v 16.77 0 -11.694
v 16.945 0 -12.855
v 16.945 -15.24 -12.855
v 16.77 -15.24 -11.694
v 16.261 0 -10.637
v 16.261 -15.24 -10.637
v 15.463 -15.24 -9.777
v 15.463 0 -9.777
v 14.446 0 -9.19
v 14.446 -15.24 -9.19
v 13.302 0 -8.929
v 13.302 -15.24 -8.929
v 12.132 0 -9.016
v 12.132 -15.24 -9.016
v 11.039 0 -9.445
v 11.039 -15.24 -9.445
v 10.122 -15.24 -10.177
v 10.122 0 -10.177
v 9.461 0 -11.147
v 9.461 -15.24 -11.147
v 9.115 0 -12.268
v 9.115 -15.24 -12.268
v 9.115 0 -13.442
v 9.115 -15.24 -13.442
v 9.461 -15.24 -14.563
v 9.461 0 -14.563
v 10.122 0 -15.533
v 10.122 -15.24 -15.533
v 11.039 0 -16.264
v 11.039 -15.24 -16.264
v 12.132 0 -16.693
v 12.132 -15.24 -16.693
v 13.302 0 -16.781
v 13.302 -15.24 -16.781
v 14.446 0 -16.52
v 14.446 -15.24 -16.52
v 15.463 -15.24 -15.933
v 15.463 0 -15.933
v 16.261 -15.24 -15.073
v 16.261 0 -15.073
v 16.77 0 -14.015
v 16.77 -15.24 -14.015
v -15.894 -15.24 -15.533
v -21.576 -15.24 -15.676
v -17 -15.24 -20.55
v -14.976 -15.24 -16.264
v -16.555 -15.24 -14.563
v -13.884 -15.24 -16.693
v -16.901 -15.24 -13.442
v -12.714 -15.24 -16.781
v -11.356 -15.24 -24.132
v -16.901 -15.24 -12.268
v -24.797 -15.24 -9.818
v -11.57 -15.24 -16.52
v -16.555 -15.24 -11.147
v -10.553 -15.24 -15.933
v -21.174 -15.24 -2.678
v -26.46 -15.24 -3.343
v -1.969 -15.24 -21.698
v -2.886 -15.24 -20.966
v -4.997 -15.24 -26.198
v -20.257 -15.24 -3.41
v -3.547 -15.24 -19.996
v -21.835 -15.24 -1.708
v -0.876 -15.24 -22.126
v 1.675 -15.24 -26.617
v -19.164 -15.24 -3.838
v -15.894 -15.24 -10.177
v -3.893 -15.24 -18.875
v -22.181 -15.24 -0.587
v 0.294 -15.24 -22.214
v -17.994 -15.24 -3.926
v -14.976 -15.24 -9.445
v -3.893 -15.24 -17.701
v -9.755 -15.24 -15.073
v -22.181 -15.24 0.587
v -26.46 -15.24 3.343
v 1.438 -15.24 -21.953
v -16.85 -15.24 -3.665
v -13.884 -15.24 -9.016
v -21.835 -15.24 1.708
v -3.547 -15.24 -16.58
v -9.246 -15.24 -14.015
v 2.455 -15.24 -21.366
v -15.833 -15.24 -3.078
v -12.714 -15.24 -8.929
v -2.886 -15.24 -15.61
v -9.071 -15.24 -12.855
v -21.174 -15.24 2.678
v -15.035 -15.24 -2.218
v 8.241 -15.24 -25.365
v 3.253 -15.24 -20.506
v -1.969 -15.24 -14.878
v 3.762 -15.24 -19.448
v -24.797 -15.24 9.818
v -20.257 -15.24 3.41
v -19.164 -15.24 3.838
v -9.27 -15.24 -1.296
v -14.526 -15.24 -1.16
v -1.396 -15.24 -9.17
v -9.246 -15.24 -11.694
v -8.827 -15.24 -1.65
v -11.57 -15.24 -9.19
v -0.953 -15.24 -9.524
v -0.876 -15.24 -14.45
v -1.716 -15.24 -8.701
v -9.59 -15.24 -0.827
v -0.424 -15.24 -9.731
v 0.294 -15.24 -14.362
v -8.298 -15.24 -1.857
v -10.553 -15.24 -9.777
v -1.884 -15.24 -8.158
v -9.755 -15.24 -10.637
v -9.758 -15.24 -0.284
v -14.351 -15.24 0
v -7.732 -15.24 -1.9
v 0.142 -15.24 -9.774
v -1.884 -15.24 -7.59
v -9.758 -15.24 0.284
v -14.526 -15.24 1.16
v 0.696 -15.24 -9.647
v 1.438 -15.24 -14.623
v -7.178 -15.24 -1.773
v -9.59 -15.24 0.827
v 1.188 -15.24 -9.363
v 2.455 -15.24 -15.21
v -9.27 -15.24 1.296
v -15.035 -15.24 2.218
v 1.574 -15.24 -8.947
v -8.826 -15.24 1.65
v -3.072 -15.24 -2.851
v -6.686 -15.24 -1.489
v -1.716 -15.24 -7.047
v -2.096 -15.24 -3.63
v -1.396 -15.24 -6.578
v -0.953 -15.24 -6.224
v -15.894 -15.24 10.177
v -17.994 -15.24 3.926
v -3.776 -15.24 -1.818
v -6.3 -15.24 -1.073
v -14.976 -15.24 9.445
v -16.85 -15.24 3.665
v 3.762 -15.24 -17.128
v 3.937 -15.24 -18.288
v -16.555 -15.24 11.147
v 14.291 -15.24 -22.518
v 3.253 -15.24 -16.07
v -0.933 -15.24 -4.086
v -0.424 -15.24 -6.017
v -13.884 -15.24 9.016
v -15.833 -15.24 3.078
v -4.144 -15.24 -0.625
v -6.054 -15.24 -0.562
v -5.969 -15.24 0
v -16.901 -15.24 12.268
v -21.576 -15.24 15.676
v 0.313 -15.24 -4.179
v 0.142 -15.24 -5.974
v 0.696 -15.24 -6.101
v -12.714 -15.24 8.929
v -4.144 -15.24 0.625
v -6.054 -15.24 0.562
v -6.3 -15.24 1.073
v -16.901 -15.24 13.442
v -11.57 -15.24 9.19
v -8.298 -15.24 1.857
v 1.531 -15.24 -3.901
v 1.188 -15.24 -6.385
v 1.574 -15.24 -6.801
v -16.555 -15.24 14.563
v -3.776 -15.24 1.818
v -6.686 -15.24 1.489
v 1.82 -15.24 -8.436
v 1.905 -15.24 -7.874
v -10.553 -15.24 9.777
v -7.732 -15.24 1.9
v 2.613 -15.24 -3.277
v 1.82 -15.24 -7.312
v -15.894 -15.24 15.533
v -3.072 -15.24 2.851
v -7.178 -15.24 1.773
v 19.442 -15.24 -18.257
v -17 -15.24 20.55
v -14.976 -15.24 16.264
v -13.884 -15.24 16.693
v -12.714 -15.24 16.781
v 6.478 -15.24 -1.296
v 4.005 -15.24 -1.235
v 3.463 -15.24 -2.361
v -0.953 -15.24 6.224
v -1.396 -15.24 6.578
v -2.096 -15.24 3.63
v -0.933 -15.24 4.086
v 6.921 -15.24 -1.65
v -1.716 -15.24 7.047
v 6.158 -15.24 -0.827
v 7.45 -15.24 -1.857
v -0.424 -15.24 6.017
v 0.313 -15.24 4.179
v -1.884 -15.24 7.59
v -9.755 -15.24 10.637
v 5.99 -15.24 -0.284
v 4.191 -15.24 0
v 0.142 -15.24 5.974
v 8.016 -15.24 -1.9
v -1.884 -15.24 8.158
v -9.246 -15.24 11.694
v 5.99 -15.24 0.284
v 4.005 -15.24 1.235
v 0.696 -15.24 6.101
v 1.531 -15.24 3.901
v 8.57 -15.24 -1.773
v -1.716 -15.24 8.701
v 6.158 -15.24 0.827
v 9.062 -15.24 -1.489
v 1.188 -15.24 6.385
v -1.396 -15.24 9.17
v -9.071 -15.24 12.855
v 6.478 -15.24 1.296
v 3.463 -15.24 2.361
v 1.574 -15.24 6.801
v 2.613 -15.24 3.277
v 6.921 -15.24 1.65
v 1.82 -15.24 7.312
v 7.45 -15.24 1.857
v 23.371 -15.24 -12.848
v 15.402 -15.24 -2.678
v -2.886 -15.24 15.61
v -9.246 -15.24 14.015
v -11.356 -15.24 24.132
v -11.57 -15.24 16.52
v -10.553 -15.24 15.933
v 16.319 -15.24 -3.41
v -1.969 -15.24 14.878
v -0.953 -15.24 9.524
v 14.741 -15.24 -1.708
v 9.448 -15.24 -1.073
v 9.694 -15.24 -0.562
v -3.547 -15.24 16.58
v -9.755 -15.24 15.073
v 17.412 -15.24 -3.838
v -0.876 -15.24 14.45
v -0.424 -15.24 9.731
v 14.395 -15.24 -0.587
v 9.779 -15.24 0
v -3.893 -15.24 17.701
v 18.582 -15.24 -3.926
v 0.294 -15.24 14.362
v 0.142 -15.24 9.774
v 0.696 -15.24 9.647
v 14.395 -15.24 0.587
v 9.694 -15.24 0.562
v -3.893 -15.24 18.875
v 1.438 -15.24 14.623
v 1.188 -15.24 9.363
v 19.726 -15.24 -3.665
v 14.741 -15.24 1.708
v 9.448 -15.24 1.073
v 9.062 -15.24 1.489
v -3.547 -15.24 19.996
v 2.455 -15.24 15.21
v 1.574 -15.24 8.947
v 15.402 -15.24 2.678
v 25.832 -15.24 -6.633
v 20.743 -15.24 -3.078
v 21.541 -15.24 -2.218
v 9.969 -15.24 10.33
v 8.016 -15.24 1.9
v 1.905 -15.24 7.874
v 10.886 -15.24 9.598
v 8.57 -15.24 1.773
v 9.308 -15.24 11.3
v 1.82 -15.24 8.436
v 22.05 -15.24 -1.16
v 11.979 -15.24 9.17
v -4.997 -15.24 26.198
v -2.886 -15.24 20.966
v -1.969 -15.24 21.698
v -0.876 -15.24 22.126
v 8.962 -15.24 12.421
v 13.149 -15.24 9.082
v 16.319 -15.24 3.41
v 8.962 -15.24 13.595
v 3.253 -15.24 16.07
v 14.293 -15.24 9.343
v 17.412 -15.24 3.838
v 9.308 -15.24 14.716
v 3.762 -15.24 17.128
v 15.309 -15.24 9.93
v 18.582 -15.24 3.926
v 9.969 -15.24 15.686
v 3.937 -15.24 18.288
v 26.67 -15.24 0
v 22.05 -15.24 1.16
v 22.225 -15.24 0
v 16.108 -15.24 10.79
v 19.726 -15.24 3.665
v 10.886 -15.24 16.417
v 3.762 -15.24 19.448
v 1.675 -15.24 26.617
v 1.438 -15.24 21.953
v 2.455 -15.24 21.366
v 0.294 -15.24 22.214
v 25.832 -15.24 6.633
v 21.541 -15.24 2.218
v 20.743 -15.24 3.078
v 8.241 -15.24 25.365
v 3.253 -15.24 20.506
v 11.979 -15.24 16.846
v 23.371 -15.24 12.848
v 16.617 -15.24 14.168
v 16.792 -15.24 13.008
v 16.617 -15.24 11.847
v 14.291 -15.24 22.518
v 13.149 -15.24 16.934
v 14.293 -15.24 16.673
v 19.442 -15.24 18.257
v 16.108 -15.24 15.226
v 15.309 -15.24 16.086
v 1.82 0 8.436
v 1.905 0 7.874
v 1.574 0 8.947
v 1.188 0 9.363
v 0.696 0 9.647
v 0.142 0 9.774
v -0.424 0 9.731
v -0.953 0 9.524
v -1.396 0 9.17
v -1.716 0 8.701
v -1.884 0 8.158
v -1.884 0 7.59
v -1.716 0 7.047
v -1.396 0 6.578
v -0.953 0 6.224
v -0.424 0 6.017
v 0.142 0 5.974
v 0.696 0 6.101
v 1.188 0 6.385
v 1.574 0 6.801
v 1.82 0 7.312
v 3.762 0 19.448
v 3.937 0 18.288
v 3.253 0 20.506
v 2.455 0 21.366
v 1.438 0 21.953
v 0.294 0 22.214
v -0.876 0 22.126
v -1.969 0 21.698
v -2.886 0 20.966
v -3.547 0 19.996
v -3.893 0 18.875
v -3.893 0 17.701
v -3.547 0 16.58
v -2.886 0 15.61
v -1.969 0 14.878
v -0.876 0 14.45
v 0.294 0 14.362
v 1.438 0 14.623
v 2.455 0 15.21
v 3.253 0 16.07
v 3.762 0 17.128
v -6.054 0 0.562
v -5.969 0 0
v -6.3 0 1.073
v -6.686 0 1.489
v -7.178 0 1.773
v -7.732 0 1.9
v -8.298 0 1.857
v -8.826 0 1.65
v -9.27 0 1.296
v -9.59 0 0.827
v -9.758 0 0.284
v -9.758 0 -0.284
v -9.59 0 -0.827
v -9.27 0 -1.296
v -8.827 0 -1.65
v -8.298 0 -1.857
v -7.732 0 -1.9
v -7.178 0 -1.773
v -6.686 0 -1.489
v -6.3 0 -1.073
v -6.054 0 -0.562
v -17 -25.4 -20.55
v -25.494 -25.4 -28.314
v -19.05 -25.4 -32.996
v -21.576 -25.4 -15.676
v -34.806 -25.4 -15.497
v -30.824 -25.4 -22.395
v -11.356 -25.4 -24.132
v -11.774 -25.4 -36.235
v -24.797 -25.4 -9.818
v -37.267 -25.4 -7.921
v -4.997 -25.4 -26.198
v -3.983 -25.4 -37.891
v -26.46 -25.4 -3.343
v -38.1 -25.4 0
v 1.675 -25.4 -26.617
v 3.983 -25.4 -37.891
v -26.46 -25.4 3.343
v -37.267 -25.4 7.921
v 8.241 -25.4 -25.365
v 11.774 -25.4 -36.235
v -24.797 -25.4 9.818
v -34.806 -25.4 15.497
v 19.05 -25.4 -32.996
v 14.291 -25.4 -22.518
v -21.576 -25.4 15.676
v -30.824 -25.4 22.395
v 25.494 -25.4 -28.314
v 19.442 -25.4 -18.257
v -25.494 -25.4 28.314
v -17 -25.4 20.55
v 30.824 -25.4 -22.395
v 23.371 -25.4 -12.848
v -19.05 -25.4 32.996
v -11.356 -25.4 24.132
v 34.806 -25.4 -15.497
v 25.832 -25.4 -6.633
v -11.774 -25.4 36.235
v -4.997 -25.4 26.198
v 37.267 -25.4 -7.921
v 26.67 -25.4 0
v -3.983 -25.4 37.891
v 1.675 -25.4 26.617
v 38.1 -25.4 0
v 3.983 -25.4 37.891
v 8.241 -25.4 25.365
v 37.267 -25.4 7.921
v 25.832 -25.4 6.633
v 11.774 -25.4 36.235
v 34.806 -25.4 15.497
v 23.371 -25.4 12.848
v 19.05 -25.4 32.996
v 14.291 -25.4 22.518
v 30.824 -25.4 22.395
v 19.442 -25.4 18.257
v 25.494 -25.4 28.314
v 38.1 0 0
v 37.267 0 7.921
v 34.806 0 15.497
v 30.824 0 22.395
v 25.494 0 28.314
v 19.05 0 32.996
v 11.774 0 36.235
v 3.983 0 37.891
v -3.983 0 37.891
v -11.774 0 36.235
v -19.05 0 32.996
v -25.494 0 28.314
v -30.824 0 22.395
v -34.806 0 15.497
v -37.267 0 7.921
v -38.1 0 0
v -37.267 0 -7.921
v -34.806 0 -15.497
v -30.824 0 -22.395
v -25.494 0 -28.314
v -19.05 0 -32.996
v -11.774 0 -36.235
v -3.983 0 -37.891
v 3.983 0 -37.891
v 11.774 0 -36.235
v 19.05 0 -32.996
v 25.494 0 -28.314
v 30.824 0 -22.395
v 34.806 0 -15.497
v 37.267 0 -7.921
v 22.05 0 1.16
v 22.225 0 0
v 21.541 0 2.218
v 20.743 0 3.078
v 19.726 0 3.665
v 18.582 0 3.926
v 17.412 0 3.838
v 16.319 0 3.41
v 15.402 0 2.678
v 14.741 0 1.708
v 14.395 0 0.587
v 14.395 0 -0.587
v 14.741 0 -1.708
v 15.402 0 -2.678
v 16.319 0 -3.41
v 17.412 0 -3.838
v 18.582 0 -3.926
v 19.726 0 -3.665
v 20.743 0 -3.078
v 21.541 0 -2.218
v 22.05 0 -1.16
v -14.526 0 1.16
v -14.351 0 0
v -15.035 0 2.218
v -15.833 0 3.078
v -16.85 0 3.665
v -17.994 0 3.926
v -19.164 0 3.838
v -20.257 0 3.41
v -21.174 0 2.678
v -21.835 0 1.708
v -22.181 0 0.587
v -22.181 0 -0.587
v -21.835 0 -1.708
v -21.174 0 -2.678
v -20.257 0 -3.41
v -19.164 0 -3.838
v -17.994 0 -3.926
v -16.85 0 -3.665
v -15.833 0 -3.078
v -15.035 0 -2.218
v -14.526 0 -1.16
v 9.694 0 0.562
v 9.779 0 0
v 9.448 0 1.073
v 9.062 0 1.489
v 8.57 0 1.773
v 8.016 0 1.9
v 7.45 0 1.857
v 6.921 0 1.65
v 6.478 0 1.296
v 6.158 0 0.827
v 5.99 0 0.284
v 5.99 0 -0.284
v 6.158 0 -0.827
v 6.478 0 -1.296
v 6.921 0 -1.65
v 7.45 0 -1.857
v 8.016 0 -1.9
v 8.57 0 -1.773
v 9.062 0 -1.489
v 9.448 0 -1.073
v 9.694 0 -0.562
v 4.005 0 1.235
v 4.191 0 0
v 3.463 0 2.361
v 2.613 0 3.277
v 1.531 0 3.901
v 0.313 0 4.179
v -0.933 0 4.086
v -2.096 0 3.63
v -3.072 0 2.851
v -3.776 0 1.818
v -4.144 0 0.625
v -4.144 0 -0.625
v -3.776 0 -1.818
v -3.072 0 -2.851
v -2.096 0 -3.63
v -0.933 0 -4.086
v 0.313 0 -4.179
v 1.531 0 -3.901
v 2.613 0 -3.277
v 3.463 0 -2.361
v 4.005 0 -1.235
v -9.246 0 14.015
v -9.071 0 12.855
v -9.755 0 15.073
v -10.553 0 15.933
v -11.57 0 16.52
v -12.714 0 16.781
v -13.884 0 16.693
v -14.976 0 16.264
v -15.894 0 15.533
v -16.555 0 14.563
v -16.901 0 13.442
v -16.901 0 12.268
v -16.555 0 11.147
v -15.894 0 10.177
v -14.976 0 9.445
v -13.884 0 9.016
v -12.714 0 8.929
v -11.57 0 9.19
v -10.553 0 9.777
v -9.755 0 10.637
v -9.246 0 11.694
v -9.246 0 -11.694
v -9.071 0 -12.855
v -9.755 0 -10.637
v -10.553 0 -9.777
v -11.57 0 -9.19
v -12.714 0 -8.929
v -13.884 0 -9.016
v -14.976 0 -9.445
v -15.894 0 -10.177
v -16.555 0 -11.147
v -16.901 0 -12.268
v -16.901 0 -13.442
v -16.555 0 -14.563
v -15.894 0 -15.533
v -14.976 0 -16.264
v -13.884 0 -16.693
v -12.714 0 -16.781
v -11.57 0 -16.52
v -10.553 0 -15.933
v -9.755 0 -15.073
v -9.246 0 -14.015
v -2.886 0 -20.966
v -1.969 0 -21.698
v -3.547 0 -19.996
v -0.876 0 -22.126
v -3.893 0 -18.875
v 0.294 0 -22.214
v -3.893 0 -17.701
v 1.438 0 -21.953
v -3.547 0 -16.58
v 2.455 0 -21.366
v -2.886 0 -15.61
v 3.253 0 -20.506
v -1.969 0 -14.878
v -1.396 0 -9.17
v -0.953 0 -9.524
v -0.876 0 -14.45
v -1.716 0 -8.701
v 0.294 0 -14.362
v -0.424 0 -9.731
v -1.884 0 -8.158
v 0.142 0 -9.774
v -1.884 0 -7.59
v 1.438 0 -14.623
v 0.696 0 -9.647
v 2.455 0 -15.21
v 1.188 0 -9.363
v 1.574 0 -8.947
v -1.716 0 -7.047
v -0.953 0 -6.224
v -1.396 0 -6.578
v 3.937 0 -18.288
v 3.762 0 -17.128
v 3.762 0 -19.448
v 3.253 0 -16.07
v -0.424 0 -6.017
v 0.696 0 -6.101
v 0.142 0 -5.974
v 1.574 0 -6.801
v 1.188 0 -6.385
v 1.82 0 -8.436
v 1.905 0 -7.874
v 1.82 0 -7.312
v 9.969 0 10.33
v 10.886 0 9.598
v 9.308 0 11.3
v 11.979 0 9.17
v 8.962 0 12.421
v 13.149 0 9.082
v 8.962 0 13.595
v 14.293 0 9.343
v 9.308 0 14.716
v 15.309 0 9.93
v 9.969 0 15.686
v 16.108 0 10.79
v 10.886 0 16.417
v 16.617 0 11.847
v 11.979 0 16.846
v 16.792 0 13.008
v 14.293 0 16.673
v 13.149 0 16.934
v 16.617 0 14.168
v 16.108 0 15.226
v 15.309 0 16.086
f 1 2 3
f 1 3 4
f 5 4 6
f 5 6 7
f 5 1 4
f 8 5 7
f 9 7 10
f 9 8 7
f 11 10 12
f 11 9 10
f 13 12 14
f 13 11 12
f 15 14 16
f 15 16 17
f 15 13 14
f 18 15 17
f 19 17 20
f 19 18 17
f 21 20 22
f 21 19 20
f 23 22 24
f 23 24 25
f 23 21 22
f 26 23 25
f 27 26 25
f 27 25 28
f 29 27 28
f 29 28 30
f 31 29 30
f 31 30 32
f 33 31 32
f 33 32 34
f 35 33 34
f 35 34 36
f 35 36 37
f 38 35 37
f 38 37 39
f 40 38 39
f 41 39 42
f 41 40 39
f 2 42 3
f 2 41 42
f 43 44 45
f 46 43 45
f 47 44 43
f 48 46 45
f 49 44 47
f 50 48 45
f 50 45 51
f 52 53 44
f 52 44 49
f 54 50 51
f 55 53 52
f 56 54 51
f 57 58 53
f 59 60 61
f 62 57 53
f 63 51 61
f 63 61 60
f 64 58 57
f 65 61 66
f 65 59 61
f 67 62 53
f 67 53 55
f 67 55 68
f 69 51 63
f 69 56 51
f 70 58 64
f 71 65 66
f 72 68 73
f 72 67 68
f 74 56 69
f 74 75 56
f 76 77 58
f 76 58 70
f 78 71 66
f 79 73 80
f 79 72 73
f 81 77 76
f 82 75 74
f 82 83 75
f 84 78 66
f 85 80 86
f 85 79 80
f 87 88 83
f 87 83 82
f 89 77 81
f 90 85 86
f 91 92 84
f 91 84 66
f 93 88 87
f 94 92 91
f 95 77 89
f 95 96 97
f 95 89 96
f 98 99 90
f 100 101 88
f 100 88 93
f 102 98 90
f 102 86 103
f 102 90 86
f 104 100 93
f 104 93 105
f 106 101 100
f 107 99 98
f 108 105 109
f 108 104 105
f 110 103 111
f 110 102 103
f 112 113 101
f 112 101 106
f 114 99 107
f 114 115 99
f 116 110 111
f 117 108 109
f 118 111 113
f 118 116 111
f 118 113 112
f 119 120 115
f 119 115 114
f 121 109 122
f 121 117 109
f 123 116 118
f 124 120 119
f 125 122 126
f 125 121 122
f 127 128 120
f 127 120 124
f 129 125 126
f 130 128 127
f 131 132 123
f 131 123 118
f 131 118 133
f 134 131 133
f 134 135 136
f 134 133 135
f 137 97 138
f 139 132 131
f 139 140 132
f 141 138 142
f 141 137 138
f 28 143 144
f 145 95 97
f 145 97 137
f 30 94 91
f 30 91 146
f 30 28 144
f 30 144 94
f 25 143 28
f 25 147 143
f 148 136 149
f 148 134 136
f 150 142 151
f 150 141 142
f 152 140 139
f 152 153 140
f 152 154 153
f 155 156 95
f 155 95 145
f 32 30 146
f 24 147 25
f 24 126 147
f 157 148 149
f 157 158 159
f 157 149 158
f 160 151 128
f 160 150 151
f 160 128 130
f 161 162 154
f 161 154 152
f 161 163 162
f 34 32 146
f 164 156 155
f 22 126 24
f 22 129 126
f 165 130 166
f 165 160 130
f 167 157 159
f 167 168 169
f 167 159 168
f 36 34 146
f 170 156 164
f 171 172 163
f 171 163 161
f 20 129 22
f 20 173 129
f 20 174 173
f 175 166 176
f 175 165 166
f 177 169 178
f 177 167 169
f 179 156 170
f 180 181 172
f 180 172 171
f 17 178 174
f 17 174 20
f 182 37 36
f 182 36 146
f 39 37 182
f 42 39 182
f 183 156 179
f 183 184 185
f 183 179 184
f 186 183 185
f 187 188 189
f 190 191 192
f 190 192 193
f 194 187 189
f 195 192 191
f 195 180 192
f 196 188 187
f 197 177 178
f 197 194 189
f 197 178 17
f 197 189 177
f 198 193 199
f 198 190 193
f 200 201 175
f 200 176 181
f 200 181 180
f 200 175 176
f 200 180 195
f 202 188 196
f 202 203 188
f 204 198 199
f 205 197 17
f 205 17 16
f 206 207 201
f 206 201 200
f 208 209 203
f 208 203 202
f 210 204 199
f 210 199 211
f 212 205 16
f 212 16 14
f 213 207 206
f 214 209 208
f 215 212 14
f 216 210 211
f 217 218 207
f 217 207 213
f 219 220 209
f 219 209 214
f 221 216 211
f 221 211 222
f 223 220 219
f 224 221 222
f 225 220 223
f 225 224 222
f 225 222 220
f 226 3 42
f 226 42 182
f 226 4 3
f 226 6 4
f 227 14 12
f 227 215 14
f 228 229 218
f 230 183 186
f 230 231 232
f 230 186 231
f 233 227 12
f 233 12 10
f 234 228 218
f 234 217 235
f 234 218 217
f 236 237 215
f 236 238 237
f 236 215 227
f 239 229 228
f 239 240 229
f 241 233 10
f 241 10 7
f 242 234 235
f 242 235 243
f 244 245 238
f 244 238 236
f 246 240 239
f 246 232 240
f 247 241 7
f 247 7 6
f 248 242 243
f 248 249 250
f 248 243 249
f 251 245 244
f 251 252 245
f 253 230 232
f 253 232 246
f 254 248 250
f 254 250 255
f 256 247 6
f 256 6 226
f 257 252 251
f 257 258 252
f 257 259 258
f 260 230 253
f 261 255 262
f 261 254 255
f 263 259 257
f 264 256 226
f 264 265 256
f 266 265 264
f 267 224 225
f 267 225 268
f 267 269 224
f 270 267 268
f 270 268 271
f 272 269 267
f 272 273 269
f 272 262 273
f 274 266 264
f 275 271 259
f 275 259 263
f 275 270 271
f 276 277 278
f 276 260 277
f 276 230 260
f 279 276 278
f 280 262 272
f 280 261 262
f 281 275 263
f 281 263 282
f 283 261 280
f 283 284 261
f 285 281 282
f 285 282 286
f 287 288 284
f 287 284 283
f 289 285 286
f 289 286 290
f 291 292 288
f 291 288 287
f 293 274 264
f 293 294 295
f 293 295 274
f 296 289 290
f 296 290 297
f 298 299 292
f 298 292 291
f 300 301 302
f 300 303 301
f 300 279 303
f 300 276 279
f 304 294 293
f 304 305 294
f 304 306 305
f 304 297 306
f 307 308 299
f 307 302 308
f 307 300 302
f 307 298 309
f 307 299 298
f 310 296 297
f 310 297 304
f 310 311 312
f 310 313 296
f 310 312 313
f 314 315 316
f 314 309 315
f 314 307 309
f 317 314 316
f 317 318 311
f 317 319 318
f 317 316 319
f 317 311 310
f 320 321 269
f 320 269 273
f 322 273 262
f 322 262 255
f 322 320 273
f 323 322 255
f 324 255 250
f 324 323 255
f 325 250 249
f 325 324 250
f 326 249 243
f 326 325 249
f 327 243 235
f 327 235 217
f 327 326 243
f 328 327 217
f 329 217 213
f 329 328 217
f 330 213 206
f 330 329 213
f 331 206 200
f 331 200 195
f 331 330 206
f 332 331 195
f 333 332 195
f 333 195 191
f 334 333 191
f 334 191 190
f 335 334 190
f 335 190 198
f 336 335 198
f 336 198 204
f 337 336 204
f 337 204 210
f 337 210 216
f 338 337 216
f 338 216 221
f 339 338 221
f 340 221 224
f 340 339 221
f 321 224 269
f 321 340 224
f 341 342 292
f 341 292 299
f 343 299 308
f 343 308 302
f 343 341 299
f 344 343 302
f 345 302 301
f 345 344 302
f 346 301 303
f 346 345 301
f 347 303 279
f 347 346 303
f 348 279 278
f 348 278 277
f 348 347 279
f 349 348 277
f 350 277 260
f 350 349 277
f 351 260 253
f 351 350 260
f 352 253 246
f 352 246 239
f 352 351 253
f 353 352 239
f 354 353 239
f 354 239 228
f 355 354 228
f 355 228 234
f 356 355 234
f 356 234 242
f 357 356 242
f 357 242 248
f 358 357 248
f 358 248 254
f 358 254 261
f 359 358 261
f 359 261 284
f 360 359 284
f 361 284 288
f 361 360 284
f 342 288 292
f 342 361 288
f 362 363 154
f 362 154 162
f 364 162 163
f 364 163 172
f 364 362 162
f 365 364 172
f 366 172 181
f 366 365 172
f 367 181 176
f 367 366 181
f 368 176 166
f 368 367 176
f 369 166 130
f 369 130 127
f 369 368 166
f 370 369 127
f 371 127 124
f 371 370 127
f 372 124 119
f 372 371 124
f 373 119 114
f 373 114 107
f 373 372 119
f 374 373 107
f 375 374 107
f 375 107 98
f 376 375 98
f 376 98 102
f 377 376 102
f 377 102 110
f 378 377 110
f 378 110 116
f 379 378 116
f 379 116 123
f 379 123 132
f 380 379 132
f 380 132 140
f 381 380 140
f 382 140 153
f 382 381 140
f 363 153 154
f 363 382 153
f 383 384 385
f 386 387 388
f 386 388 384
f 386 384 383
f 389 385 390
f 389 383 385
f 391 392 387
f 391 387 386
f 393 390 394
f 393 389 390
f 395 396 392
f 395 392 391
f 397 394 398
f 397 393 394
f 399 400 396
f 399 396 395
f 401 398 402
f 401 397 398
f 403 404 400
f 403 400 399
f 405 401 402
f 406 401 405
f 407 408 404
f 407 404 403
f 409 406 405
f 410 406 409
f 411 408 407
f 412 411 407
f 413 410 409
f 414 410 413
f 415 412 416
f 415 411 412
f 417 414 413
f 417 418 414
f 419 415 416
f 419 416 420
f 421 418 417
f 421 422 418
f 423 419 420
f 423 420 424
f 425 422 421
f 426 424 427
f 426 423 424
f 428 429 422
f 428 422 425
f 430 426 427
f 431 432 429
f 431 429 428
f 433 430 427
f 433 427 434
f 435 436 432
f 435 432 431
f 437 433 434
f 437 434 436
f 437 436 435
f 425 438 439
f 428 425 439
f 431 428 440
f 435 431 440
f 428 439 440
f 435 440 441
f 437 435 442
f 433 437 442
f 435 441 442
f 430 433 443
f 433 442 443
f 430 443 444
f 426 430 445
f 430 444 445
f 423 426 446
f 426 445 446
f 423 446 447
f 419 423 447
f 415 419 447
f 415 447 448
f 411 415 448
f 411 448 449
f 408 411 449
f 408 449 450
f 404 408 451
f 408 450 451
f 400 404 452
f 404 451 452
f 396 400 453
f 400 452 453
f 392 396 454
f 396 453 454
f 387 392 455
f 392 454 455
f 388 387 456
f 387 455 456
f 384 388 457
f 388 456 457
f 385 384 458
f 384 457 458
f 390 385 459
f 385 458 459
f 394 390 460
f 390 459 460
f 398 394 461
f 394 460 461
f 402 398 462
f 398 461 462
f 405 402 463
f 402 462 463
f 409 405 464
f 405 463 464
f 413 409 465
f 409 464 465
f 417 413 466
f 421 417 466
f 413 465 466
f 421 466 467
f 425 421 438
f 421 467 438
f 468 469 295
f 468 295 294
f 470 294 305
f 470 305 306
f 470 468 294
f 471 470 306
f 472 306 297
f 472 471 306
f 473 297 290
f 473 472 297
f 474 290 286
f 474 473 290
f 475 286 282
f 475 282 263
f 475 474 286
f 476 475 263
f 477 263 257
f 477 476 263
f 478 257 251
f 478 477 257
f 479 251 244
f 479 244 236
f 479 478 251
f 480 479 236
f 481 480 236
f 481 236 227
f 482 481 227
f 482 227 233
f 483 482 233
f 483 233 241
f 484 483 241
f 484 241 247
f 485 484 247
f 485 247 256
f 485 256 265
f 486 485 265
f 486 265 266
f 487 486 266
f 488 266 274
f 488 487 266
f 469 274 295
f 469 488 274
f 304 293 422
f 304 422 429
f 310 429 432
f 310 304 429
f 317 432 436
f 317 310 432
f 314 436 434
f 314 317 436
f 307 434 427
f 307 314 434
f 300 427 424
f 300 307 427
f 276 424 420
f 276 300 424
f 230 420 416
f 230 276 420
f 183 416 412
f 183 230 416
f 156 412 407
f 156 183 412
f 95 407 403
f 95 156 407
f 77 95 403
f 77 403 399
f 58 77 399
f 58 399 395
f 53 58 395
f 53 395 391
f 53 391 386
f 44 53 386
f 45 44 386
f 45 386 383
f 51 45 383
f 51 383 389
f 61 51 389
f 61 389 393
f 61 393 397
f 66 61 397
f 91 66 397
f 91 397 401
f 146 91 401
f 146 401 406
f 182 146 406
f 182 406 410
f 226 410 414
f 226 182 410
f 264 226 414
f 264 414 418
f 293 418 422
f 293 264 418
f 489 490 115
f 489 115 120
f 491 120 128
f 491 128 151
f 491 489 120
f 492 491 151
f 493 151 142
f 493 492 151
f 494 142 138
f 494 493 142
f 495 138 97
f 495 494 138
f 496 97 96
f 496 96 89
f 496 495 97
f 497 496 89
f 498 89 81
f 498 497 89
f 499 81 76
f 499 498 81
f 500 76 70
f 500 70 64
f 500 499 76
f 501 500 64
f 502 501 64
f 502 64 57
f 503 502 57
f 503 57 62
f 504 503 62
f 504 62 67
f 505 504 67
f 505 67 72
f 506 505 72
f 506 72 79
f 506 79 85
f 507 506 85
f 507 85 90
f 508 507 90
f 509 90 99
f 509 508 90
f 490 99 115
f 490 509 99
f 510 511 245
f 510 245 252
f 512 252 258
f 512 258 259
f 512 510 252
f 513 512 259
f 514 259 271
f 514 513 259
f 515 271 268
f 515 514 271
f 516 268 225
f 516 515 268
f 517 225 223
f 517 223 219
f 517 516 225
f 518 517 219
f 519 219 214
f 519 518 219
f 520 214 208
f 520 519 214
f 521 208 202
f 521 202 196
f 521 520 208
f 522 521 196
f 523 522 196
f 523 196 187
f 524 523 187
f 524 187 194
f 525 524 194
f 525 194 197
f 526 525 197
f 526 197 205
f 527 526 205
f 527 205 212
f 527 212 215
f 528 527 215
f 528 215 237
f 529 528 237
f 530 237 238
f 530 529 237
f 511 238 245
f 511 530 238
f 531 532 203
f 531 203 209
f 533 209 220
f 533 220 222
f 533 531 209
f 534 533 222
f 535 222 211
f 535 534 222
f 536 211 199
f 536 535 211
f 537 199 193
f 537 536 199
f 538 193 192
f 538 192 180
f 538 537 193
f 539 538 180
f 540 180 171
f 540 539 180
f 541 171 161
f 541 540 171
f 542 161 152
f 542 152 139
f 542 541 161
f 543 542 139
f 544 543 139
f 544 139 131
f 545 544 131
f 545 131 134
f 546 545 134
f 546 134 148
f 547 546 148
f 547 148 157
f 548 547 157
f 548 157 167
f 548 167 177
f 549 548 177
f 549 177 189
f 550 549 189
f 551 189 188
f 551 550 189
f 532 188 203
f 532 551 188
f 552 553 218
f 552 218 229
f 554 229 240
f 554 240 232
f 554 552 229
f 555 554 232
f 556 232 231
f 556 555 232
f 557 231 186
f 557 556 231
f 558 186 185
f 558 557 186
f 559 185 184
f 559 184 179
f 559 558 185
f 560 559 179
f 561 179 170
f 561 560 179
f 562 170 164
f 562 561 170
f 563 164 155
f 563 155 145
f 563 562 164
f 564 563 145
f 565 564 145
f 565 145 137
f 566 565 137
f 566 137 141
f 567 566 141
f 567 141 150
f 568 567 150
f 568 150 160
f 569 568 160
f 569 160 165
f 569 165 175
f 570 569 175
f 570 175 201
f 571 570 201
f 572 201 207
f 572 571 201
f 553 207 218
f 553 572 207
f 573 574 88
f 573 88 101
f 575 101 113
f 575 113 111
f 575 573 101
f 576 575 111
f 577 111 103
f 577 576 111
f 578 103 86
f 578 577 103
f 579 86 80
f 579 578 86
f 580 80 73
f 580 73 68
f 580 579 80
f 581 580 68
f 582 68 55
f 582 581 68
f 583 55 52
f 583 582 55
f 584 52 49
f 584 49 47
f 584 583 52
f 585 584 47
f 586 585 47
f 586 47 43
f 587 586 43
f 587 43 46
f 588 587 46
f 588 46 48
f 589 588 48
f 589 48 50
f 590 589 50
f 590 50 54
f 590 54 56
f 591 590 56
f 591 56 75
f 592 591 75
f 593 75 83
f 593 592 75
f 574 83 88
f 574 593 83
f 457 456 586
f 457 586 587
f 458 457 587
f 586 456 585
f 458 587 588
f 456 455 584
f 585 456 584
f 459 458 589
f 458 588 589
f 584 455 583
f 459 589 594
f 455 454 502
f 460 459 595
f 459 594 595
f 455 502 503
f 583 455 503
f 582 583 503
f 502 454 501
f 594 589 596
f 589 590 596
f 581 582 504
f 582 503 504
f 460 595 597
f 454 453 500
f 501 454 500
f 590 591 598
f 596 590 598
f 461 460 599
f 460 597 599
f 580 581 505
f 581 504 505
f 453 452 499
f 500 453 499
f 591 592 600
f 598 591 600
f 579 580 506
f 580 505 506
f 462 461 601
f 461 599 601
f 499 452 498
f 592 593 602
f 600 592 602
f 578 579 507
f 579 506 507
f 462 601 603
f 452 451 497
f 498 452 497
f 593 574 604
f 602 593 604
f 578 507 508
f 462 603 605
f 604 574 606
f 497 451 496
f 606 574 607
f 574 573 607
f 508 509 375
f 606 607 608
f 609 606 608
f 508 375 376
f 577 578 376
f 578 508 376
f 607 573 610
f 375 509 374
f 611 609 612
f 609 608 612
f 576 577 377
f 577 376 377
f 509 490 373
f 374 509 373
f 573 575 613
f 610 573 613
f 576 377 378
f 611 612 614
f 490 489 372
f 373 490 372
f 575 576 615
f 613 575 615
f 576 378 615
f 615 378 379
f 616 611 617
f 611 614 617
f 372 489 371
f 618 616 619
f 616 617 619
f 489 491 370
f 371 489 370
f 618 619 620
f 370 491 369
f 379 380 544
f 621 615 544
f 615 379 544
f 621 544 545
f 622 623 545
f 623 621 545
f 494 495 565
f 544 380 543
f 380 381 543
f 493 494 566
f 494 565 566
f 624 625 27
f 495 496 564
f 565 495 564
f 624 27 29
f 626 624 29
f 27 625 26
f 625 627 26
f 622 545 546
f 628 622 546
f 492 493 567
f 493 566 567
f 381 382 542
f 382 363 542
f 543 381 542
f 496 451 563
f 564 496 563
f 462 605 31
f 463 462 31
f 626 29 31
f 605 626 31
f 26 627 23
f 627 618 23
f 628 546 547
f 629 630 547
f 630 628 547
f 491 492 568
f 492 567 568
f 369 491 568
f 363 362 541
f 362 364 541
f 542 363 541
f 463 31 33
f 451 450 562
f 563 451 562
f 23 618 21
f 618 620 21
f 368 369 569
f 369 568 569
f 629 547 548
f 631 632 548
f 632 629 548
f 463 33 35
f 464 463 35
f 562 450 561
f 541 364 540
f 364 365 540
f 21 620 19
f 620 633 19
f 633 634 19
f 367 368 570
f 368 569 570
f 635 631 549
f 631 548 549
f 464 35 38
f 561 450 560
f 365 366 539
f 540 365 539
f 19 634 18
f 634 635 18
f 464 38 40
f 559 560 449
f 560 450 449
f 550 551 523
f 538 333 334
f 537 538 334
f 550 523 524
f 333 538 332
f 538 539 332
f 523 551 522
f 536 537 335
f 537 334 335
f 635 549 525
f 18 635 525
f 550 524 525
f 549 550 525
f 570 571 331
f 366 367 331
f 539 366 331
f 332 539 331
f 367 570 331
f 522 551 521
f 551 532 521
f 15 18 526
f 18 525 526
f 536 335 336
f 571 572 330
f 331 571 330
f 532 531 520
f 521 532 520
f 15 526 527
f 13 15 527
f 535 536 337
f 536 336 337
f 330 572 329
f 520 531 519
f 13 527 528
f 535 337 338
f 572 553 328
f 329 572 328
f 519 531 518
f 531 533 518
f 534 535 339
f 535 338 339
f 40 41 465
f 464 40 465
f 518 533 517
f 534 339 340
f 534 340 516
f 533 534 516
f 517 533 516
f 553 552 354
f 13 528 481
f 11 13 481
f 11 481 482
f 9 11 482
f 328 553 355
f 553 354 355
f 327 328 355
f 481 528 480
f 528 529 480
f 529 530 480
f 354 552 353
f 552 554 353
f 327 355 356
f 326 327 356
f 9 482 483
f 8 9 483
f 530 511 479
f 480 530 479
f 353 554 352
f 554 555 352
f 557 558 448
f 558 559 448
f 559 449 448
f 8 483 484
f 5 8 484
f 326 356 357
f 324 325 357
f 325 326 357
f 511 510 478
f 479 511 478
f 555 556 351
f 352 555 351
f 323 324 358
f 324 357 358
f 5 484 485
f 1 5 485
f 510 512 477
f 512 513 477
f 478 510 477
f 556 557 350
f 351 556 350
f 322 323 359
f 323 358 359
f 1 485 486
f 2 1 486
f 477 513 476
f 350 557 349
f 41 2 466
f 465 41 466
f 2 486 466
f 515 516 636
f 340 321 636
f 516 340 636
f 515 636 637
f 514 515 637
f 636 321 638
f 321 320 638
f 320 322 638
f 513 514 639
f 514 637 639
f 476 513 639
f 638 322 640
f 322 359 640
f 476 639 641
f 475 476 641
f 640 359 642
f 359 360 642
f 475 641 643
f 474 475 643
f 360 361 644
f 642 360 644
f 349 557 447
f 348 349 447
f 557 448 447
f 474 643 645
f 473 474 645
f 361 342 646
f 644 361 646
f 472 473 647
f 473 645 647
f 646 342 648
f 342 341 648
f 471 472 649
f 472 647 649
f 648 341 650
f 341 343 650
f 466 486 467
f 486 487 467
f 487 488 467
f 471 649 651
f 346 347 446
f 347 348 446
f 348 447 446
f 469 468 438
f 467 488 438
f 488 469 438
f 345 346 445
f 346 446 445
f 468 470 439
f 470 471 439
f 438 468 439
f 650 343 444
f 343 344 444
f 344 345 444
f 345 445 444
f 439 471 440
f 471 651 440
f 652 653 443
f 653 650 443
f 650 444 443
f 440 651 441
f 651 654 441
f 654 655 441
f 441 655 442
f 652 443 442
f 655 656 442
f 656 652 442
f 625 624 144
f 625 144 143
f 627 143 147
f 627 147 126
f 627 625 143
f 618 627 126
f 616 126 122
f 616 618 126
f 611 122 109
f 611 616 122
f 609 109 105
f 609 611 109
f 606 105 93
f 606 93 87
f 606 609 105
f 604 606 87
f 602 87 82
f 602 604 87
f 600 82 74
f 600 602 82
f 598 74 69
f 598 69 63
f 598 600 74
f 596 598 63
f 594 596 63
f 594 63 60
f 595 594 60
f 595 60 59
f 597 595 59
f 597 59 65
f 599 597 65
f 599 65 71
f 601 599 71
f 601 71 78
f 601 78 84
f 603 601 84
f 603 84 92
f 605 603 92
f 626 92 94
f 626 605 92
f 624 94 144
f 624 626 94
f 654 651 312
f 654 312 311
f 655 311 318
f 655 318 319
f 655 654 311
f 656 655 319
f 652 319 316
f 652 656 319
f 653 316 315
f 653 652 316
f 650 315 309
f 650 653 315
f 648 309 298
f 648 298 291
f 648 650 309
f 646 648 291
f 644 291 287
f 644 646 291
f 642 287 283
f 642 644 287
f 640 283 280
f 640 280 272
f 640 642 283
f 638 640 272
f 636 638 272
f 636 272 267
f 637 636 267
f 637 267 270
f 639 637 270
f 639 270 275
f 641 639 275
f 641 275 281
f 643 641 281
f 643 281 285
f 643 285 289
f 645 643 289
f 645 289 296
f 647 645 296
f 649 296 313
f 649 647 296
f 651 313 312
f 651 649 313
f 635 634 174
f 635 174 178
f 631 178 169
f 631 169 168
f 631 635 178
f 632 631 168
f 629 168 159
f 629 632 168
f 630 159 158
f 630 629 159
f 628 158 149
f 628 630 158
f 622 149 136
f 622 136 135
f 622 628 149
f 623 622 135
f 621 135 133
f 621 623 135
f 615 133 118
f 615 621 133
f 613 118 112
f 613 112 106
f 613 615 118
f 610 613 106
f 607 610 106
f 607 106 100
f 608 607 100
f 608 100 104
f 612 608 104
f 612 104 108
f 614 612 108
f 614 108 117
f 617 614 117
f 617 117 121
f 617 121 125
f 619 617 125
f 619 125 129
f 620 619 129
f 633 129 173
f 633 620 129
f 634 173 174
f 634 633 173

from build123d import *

# Parameters (mm, degrees)
F0_R     = 38.1
F0_R_2   = 36.83
F0_R_3   = 26.67
F1_DEPTH = 25.4
F0_R_4   = 3.937
F0_R_5   = 1.905
F0_R_6   = 4.191
F2_DEPTH = 15.24


with BuildPart() as f1:
    # F0 (on Front) → F1 (new body)
    with BuildSketch(Plane.XZ):
        Circle(F0_R)
        Circle(F0_R_2, mode=Mode.SUBTRACT)
        Circle(F0_R_2)
        Circle(F0_R_3, mode=Mode.SUBTRACT)
    extrude(amount=F1_DEPTH)

    # F0 (on Front) → F2 (join)
    with BuildSketch(Plane.XZ):
        Circle(F0_R_3)
        with Locations((-13.007903, -12.854781)):
            Circle(F0_R_4, mode=Mode.SUBTRACT)
        with Locations((0, -18.288)):
            Circle(F0_R_4, mode=Mode.SUBTRACT)
        with Locations((13.007903, -12.854781)):
            Circle(F0_R_4, mode=Mode.SUBTRACT)
        with Locations((0, -7.874)):
            Circle(F0_R_5, mode=Mode.SUBTRACT)
        with Locations((-18.288, 0)):
            Circle(F0_R_4, mode=Mode.SUBTRACT)
        with Locations((-7.874, 0)):
            Circle(F0_R_5, mode=Mode.SUBTRACT)
        with Locations((-13.007903, 12.854781)):
            Circle(F0_R_4, mode=Mode.SUBTRACT)
        Circle(F0_R_6, mode=Mode.SUBTRACT)
        with Locations((7.874, 0)):
            Circle(F0_R_5, mode=Mode.SUBTRACT)
        with Locations((0, 7.874)):
            Circle(F0_R_5, mode=Mode.SUBTRACT)
        with Locations((18.288, 0)):
            Circle(F0_R_4, mode=Mode.SUBTRACT)
        with Locations((0, 18.288)):
            Circle(F0_R_4, mode=Mode.SUBTRACT)
        with Locations((12.854781, 13.007903)):
            Circle(F0_R_4, mode=Mode.SUBTRACT)
    extrude(amount=F2_DEPTH)


solid = f1.part
